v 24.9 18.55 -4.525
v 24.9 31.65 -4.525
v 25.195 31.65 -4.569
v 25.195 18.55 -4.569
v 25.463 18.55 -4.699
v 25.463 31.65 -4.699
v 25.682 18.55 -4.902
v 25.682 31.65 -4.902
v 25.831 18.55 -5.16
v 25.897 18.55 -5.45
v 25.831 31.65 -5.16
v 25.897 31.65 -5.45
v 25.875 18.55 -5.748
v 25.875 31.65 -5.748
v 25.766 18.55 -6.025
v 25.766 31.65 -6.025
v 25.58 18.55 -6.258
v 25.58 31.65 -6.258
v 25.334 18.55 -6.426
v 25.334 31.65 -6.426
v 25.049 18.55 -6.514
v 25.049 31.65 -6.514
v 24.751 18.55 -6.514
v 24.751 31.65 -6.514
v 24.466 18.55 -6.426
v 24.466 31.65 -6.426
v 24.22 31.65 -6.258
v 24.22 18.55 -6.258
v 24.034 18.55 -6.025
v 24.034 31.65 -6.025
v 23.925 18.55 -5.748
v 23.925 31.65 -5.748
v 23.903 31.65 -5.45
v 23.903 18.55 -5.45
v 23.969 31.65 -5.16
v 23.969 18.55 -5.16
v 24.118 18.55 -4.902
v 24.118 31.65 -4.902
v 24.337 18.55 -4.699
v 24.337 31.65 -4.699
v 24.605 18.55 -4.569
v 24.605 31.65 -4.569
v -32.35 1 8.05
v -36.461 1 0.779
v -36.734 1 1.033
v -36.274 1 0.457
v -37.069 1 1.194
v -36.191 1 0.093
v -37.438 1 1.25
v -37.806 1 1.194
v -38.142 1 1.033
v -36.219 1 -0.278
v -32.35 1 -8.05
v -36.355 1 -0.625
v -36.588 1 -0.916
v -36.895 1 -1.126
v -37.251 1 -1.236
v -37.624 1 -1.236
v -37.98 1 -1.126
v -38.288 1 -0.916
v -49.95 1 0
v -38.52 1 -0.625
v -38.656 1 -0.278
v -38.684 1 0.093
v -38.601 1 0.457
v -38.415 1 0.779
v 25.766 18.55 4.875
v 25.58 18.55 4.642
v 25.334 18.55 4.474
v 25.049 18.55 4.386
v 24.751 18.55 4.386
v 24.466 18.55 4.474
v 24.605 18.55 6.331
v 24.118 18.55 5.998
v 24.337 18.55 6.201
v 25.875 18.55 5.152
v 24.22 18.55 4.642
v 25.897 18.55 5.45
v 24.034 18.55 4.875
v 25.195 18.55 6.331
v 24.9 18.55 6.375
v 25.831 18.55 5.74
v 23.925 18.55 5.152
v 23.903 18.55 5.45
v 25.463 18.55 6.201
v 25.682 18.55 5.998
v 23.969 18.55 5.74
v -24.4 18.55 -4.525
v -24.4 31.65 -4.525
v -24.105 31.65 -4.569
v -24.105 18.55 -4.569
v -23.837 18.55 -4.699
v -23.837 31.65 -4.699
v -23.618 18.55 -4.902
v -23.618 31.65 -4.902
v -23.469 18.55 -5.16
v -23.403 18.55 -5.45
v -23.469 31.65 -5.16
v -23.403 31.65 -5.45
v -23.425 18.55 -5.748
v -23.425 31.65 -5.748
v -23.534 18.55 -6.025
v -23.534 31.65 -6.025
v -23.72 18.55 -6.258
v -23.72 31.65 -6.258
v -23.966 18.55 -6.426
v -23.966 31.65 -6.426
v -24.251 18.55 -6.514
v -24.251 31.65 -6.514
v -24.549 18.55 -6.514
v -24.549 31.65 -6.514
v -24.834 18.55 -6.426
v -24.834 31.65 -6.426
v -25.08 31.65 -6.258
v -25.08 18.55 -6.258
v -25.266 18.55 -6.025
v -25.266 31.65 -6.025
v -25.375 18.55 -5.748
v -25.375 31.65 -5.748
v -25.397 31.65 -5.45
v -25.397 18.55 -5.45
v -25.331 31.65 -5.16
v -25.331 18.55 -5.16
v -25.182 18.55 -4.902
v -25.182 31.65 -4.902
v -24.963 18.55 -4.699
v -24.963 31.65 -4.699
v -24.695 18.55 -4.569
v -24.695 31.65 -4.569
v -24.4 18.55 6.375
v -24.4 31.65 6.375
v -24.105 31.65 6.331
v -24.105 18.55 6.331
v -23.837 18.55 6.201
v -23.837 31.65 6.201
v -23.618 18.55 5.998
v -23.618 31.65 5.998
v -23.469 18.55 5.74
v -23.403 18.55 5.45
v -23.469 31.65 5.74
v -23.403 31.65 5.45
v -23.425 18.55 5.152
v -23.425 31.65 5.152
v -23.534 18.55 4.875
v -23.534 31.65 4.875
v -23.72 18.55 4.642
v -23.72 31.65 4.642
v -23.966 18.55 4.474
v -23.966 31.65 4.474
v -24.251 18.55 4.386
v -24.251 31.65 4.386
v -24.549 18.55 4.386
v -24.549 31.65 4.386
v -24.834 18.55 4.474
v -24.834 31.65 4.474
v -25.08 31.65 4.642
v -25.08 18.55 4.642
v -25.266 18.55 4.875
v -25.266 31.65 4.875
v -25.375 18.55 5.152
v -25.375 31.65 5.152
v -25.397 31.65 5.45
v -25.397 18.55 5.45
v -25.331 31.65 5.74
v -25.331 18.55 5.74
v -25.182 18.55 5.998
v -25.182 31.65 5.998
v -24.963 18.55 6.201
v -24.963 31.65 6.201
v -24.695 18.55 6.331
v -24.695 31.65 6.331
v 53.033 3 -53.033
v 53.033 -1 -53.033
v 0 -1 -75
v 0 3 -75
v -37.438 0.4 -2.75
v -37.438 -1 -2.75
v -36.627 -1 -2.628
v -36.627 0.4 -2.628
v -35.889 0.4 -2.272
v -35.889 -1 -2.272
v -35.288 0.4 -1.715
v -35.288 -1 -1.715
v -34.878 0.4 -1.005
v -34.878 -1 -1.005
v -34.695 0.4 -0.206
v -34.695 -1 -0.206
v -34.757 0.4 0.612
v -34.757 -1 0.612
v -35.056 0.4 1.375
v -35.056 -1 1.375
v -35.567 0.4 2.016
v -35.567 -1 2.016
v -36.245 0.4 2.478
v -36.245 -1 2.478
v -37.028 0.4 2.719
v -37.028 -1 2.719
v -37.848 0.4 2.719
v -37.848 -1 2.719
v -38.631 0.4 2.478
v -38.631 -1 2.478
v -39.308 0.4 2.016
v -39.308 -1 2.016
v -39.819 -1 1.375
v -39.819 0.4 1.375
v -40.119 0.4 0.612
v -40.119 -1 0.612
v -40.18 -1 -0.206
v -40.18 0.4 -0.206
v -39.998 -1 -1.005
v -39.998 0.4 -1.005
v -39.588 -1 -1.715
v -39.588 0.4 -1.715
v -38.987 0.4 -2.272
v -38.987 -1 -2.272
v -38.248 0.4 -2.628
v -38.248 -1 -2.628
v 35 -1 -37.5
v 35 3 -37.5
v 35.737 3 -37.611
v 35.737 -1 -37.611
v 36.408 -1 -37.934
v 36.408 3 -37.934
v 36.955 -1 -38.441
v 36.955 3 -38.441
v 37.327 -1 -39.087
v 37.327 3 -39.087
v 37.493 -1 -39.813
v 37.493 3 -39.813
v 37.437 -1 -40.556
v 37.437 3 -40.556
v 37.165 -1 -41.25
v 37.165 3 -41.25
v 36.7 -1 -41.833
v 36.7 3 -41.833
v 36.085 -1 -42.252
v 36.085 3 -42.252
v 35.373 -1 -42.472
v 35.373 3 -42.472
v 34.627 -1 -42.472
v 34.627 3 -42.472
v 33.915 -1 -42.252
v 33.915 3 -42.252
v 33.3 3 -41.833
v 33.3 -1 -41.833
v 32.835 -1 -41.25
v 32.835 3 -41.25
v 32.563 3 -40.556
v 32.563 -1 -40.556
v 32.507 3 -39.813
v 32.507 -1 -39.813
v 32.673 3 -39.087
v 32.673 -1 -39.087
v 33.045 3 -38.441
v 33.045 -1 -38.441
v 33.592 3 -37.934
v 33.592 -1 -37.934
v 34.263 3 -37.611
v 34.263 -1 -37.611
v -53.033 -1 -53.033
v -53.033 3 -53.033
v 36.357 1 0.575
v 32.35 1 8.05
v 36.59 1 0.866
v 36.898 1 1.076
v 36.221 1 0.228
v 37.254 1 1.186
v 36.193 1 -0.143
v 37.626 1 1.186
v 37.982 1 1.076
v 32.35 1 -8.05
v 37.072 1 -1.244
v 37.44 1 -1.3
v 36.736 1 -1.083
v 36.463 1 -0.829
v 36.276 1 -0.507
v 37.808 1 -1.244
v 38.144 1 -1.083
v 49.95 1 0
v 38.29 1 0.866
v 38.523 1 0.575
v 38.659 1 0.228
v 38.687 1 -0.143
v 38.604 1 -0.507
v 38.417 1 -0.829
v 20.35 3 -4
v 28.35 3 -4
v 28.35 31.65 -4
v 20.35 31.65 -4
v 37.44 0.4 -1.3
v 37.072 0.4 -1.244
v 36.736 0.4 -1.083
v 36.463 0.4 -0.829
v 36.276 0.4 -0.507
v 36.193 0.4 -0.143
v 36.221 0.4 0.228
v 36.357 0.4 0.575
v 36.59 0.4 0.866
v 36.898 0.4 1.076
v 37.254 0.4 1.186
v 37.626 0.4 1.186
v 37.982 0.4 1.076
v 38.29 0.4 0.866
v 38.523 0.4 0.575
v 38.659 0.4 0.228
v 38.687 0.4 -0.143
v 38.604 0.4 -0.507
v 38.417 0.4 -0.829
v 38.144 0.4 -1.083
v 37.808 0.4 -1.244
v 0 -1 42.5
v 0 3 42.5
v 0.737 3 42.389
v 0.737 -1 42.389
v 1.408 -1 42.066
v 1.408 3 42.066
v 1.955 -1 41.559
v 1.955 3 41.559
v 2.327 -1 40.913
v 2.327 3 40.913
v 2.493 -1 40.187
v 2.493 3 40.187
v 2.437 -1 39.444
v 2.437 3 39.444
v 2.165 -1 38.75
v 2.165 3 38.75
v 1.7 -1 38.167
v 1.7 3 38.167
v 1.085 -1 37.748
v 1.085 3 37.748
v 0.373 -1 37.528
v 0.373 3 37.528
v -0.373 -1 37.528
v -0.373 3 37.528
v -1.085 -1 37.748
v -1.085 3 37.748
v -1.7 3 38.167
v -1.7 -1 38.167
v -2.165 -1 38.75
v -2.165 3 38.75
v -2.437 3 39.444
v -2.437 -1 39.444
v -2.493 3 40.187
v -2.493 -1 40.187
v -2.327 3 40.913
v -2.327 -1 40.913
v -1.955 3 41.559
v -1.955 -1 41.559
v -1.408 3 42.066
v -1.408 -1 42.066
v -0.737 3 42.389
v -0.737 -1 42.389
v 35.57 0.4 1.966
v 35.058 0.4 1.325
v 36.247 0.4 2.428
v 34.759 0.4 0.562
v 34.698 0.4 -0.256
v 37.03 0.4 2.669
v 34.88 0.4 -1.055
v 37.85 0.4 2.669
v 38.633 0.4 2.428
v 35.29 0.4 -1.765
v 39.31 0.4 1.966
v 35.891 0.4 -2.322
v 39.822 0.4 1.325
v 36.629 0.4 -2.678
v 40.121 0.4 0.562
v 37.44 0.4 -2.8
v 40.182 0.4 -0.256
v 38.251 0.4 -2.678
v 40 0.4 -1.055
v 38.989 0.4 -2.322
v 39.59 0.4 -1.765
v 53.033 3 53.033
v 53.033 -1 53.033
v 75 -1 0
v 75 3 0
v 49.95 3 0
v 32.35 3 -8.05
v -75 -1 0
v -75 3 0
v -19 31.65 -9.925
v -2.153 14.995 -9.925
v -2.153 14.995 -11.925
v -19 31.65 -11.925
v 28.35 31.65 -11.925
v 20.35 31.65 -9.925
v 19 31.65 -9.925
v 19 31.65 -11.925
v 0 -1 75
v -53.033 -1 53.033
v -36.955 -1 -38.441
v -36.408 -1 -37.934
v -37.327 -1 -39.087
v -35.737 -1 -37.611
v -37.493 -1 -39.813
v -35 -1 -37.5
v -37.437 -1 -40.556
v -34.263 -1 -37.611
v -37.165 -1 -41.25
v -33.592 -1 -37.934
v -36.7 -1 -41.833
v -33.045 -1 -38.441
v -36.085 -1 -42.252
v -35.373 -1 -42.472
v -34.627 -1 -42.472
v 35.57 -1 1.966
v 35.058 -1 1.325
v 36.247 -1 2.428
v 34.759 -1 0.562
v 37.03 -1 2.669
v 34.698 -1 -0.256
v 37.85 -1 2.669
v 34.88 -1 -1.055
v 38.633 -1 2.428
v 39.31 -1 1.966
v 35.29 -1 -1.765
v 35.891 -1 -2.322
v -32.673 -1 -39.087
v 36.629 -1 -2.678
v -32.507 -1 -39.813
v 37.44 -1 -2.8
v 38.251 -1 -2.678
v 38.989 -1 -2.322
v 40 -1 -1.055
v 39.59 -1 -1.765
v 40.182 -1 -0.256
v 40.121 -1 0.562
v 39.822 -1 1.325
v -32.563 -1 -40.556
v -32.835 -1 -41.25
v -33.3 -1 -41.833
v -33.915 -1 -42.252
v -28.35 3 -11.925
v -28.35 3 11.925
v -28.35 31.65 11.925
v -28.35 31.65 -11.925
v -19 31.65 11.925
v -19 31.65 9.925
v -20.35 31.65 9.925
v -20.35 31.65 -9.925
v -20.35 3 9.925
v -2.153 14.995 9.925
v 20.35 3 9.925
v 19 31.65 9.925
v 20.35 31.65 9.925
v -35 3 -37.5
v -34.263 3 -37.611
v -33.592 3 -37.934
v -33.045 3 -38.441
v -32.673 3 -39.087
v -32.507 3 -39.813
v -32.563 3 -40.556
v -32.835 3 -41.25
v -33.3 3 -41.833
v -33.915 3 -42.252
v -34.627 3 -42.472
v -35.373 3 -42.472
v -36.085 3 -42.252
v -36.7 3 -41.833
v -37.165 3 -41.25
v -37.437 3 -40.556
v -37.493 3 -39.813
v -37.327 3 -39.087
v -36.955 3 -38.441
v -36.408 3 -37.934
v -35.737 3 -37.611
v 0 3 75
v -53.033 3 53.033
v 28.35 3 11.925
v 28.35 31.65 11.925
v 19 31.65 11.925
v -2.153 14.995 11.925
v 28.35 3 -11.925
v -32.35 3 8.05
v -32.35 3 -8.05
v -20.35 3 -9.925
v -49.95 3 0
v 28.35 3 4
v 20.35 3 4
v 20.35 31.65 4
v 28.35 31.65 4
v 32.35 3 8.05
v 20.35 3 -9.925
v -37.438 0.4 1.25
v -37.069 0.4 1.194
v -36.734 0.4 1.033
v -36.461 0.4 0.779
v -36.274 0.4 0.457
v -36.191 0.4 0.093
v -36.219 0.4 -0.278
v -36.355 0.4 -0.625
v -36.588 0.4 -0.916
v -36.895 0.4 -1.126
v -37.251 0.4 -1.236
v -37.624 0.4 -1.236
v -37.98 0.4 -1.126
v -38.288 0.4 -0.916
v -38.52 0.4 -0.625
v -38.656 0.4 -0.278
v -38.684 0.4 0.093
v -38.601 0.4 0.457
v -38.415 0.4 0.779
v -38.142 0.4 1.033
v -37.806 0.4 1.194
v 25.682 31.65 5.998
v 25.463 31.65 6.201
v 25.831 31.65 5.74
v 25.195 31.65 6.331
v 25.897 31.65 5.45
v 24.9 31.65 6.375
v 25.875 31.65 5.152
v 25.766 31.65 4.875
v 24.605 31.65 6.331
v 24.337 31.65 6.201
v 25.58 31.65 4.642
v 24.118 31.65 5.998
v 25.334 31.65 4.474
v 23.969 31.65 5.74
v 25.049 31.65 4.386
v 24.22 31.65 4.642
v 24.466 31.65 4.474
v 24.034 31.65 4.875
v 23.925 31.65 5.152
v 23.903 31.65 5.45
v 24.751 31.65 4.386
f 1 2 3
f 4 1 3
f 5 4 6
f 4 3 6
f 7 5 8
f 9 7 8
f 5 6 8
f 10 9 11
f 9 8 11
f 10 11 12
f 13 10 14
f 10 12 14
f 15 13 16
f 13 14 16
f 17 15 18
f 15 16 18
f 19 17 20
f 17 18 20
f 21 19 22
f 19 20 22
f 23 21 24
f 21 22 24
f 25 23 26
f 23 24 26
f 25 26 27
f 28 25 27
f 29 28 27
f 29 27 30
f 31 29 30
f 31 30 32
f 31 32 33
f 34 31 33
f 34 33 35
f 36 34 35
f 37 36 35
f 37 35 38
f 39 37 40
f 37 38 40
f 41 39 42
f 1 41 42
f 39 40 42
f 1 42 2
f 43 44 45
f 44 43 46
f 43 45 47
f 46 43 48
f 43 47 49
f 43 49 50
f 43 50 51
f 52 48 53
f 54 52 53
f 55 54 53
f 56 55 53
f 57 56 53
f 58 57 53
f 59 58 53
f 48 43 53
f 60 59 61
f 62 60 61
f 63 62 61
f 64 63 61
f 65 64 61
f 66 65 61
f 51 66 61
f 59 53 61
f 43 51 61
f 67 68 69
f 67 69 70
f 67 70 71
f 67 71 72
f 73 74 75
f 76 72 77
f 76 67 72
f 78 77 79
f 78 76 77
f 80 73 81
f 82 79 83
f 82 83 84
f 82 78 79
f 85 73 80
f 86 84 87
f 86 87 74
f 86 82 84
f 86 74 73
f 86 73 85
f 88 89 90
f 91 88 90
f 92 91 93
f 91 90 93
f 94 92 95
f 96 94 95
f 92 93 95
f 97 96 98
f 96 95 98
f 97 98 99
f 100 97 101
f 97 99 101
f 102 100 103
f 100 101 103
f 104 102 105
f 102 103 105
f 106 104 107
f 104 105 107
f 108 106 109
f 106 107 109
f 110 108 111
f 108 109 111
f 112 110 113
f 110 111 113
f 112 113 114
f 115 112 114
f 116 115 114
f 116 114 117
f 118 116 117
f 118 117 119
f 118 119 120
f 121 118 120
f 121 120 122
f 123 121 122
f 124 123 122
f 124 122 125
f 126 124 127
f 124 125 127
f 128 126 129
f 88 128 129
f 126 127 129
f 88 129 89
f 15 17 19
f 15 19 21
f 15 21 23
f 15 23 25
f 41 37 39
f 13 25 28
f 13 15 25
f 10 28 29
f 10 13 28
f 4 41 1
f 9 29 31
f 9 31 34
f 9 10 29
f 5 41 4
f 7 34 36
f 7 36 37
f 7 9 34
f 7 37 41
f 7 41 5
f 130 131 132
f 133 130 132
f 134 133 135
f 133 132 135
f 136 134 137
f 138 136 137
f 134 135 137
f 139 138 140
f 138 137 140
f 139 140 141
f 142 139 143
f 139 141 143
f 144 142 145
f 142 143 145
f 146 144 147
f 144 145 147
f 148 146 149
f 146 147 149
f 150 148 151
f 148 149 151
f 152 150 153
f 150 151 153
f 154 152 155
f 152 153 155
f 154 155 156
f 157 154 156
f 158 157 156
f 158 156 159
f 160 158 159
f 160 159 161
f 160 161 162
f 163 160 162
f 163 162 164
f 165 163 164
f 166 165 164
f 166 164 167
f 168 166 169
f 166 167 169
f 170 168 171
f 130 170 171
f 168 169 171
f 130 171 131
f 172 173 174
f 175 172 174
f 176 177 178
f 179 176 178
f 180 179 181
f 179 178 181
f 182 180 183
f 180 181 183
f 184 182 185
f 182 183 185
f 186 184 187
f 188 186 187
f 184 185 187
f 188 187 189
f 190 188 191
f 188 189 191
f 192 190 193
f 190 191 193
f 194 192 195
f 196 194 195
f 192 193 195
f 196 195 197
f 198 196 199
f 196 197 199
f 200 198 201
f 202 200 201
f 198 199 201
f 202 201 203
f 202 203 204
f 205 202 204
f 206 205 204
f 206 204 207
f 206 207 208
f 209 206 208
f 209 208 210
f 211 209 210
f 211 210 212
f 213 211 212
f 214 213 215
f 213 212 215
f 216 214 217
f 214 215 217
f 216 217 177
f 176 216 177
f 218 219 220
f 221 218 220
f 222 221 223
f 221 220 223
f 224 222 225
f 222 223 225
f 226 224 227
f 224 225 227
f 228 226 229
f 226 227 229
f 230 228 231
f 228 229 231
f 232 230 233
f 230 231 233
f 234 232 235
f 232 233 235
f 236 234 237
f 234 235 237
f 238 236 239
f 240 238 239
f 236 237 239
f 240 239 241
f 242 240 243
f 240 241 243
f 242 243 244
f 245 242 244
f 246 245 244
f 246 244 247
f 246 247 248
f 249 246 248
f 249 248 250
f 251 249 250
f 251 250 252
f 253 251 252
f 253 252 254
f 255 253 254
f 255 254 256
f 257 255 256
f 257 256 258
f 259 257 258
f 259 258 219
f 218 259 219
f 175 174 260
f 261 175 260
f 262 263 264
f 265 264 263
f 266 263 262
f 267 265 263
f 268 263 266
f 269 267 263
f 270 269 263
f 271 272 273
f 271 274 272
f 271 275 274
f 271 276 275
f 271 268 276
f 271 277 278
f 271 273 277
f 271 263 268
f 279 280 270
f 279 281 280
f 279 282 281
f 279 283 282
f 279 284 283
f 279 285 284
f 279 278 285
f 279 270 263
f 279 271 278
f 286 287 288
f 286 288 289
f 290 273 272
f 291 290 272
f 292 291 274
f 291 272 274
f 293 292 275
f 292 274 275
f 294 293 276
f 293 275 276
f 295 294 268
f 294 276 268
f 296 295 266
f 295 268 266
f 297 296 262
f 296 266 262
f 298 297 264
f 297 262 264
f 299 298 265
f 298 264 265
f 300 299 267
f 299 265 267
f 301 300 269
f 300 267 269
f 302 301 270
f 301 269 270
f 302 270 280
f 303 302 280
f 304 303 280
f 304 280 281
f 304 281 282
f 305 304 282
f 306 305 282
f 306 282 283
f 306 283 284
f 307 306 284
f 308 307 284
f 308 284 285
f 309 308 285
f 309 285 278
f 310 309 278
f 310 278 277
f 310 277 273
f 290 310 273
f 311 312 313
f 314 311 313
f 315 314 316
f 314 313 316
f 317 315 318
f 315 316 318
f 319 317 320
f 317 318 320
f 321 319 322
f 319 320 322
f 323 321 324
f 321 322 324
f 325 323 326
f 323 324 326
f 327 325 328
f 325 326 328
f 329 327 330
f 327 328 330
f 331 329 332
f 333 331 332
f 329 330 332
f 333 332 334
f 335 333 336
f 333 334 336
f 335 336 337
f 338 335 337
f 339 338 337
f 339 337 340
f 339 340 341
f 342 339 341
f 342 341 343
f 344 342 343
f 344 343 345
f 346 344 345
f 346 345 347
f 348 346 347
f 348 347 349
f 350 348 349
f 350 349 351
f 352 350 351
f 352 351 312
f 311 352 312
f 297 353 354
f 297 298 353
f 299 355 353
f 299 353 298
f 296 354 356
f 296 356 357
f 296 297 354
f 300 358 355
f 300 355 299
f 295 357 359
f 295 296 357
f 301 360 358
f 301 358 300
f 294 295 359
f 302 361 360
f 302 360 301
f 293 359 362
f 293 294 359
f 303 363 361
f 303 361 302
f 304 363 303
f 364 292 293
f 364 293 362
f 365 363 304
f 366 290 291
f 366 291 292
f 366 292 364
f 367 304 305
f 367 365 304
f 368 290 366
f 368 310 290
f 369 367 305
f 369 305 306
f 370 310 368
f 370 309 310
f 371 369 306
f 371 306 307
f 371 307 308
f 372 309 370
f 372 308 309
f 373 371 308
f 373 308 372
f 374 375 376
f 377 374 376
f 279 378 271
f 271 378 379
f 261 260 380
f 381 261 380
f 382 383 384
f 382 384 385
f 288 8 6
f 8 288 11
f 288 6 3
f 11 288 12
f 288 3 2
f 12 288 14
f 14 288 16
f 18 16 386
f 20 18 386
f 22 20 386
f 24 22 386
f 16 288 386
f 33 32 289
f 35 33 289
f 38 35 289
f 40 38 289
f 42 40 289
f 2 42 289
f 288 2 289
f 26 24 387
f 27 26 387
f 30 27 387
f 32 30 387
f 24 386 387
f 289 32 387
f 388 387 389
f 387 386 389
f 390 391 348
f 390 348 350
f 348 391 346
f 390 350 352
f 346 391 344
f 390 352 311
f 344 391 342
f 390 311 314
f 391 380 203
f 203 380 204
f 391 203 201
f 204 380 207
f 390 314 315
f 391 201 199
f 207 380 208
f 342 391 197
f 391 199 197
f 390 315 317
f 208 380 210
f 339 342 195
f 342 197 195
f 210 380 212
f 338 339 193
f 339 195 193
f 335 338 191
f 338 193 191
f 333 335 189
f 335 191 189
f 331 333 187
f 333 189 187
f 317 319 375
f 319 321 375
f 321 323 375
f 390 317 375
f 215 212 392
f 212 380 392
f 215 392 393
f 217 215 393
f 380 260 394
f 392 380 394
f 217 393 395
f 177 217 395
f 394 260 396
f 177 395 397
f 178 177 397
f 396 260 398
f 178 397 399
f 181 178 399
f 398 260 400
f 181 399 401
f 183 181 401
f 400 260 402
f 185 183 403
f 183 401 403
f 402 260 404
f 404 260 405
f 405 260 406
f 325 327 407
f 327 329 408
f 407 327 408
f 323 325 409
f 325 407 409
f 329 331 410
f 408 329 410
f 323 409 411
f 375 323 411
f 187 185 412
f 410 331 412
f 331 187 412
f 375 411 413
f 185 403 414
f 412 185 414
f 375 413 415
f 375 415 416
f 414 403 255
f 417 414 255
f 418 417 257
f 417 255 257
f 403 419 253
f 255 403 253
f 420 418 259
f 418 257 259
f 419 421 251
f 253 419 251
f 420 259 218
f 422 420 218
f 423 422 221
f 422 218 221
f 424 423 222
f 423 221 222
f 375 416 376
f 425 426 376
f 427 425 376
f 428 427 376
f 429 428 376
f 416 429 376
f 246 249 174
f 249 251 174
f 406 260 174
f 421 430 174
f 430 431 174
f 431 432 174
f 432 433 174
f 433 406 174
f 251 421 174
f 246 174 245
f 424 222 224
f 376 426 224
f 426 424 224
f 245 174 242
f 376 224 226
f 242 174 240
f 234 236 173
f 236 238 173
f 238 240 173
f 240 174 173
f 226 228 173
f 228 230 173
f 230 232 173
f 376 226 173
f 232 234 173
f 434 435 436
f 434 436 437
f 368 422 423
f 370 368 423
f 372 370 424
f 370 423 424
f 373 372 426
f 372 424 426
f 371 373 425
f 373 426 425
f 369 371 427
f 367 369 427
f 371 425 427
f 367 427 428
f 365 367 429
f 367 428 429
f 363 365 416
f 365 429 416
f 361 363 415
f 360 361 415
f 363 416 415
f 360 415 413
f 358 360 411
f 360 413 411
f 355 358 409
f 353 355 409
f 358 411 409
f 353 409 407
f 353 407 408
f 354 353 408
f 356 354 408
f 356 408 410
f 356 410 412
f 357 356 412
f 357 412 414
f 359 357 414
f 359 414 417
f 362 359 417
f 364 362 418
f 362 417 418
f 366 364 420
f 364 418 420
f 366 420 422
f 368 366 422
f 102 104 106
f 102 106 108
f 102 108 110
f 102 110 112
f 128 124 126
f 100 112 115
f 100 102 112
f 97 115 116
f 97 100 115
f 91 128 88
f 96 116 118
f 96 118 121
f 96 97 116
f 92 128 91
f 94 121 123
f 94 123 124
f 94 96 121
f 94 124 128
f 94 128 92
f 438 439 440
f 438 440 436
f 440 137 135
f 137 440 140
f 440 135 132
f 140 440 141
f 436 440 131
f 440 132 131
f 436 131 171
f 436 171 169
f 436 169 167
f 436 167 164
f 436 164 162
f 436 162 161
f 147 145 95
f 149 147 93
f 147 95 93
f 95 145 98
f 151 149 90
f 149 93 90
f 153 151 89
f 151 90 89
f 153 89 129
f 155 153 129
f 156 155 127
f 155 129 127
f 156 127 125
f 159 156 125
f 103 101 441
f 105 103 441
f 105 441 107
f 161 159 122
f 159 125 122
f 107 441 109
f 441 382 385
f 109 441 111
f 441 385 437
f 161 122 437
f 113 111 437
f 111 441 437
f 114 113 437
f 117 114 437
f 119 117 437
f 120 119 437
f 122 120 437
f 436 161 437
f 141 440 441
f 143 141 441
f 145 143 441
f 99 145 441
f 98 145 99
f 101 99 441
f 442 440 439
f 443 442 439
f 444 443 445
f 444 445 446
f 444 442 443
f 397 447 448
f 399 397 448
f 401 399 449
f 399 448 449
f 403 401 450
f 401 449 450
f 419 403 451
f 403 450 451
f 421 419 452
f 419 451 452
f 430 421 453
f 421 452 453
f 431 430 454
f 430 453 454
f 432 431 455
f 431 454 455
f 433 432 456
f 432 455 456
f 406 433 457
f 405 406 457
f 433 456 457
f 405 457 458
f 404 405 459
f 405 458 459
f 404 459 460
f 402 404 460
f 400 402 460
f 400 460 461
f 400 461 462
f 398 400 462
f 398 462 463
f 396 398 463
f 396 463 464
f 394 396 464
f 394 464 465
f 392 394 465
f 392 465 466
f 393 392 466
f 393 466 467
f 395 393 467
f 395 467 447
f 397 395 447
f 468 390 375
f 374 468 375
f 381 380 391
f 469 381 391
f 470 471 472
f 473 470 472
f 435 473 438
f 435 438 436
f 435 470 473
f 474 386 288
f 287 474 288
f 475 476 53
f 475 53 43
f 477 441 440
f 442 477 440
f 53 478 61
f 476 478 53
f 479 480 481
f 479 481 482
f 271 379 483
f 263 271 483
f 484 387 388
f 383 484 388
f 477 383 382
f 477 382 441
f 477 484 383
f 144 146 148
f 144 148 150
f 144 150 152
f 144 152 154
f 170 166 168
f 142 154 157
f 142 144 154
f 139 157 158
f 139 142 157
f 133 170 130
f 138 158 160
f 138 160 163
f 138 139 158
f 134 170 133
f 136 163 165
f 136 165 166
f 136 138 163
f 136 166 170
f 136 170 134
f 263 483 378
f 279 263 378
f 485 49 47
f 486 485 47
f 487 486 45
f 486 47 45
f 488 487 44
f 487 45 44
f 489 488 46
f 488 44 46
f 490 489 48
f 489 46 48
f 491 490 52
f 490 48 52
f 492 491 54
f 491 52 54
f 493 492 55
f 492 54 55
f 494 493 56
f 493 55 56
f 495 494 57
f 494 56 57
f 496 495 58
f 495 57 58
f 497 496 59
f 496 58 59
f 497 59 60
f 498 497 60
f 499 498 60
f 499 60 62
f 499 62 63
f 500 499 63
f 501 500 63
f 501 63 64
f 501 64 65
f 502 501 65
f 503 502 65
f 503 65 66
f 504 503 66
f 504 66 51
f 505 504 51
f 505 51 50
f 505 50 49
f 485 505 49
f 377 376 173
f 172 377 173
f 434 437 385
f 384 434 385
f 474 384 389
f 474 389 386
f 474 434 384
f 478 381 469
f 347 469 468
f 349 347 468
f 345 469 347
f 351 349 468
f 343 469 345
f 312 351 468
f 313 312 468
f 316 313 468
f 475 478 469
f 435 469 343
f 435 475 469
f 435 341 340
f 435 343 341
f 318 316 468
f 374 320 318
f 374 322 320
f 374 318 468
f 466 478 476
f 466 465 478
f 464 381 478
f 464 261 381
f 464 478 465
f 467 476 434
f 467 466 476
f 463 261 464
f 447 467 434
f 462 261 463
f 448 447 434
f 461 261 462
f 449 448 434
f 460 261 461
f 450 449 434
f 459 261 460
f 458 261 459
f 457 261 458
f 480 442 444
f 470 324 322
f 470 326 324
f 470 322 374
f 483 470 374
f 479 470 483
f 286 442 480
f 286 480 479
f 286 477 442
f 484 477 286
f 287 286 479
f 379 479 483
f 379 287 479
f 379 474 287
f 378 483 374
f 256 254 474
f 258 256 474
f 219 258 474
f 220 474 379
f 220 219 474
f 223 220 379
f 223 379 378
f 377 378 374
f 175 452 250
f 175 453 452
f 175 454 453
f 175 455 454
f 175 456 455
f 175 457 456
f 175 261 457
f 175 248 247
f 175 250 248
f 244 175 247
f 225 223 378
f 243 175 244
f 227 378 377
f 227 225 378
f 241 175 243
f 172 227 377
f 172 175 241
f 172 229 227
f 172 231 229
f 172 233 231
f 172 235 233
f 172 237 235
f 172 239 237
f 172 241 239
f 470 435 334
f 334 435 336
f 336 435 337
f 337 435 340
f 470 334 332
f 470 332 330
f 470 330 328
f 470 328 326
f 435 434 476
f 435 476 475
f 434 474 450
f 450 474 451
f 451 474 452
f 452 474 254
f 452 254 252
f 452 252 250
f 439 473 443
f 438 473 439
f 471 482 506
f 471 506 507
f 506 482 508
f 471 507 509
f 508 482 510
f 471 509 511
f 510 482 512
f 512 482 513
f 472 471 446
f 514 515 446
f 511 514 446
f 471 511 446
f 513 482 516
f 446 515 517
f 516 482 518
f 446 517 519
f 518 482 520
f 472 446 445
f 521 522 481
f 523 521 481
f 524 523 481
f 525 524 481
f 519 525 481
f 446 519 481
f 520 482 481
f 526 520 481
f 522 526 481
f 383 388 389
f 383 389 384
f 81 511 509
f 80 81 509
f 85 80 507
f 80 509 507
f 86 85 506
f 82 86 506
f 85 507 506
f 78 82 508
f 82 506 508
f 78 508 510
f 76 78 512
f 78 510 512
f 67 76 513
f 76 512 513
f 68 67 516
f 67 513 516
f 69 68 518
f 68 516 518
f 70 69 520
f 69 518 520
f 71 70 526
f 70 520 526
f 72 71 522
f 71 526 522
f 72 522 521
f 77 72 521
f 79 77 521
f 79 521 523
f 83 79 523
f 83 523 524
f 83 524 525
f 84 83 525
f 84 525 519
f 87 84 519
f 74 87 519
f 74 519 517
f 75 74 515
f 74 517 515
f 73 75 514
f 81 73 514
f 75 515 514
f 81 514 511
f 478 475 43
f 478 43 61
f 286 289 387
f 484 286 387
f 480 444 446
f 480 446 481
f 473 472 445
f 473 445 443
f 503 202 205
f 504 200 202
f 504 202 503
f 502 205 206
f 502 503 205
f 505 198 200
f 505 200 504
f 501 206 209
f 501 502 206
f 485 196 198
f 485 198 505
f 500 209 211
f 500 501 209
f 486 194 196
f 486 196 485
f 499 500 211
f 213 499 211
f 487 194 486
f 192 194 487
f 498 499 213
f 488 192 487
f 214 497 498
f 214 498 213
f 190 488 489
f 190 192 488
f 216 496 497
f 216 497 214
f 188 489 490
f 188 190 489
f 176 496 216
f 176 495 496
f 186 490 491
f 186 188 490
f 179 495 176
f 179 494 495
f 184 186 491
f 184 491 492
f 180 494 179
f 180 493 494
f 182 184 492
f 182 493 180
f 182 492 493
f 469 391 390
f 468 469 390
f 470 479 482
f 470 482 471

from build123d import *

# Parameters (mm, degrees)
AUFSATZ_LINEAR_AUSTRAGEN1_DEPTH      = 3
AUFSATZ_LINEAR_AUSTRAGEN1_DEPTH_BACK = 1
AUFSATZ_LINEAR_AUSTRAGEN3_DEPTH      = 31.65
SCHNITT_LINEAR_AUSTRAGEN1_DEPTH      = 28.65
SKIZZE7_R                            = 2.5
SCHNITT_LINEAR_AUSTRAGEN2_DEPTH      = 110.867294952
SCHNITT_LINEAR_AUSTRAGEN6_DEPTH      = 2
SKIZZE9_R                            = 1
SCHNITT_LINEAR_AUSTRAGEN5_DEPTH      = 13.1
SKIZZE10_R                           = 1.25
SCHNITT_LINEAR_AUSTRAGEN7_DEPTH      = 111.405717696
SKIZZE11_R                           = 2.75
SCHNITT_LINEAR_AUSTRAGEN8_DEPTH      = 1.4


with BuildPart() as part:
    # Skizze2 → Aufsatz-Linear austragen1 (new, two sides: drawn at the far end of the back side and taken through both)
    with BuildSketch(Plane(origin=(0, 0, 0), x_dir=(1, 0, 0), z_dir=(0, 1, 0)).offset(-AUFSATZ_LINEAR_AUSTRAGEN1_DEPTH_BACK)):
        Polygon((-53.033008589, 53.033008589), (0, 0), (53.033008589, 53.033008589), (0, 75), align=None)
        Polygon((53.033008589, 53.033008589), (0, 0), (75, 0), align=None)
        Polygon((75, 0), (0, 0), (53.033008589, -53.033008589), align=None)
        Polygon((53.033008589, -53.033008589), (0, 0), (-53.033008589, -53.033008589), (0, -75), align=None)
        Polygon((-53.033008589, 53.033008589), (-75, 0), (0, 0), align=None)
        Polygon((0, 0), (-75, 0), (-53.033008589, -53.033008589), align=None)
    extrude(amount=AUFSATZ_LINEAR_AUSTRAGEN1_DEPTH + AUFSATZ_LINEAR_AUSTRAGEN1_DEPTH_BACK)

    # Skizze5 → Aufsatz-Linear austragen3 (add)
    with BuildSketch(Plane(origin=(0, 0, 0), x_dir=(1, 0, 0), z_dir=(0, 1, 0))):
        Polygon((20.35, -4), (28.35, -4), (28.35, -11.925), (-28.35, -11.925), (-28.35, 11.925), (28.35, 11.925), (28.35, 4), (20.35, 4), (20.35, 9.925), (-20.35, 9.925), (-20.35, -9.925), (20.35, -9.925), align=None)
    extrude(amount=AUFSATZ_LINEAR_AUSTRAGEN3_DEPTH)

    # Skizze6 → Schnitt-Linear austragen1 (cut)
    with BuildSketch(Plane.XY.offset(11.925)):
        Polygon((-19, 31.65), (19, 31.65), (-2.152730863, 14.994542406), align=None)
    extrude(amount=-SCHNITT_LINEAR_AUSTRAGEN1_DEPTH, mode=Mode.SUBTRACT)

    # Skizze7 → Schnitt-Linear austragen2 (cut, through all)
    with BuildSketch(Plane(origin=(0, 3, 0), x_dir=(1, 0, 0), z_dir=(0, 1, 0))):
        with Locations(Location((35, 40, 0), (0, 0, 270))):
            Circle(SKIZZE7_R)
        with Locations(Location((-35, 40, 0), (0, 0, 270))):
            Circle(SKIZZE7_R)
        with Locations(Location((0, -40, 0), (0, 0, 270))):
            Circle(SKIZZE7_R)
    extrude(amount=-SCHNITT_LINEAR_AUSTRAGEN2_DEPTH, mode=Mode.SUBTRACT)

    # Skizze8 → Schnitt-Linear austragen6 (cut)
    with BuildSketch(Plane(origin=(0, 3, 0), x_dir=(1, 0, 0), z_dir=(0, 1, 0))):
        Polygon((-32.35, 8.05), (-32.35, -8.05), (-49.95, 0), align=None)
        Polygon((32.35, -8.05), (49.95, 0), (32.35, 8.05), align=None)
    extrude(amount=-SCHNITT_LINEAR_AUSTRAGEN6_DEPTH, mode=Mode.SUBTRACT)

    # Skizze9 → Schnitt-Linear austragen5 (cut)
    with BuildSketch(Plane(origin=(0, 31.65, 0), x_dir=(1, 0, 0), z_dir=(0, 1, 0))):
        with Locations(Location((-24.4, -5.375, 0), (0, 0, 270))):
            Circle(SKIZZE9_R)
        with Locations(Location((-24.4, 5.525, 0), (0, 0, 270))):
            Circle(SKIZZE9_R)
        with Locations(Location((24.9, 5.525, 0), (0, 0, 270))):
            Circle(SKIZZE9_R)
        with Locations(Location((24.9, -5.375, 0), (0, 0, 270))):
            Circle(SKIZZE9_R)
    extrude(amount=-SCHNITT_LINEAR_AUSTRAGEN5_DEPTH, mode=Mode.SUBTRACT)

    # Skizze10 → Schnitt-Linear austragen7 (cut, through all)
    with BuildSketch(Plane(origin=(0, 1, 0), x_dir=(1, 0, 0), z_dir=(0, 1, 0))):
        with Locations(Location((-37.437800905, 0, 0), (0, 0, 270))):
            Circle(SKIZZE10_R)
        with Locations(Location((37.44, 0.05, 0), (0, 0, 90))):
            Circle(SKIZZE10_R)
    extrude(amount=-SCHNITT_LINEAR_AUSTRAGEN7_DEPTH, mode=Mode.SUBTRACT)

    # Skizze11 → Schnitt-Linear austragen8 (cut)
    with BuildSketch(Plane.XZ.offset(1)):
        with Locations(Location((-37.437800905, 0, 0), (0, 0, 270))):
            Circle(SKIZZE11_R)
        with Locations(Location((37.44, -0.05, 0), (0, 0, 270))):
            Circle(SKIZZE11_R)
    extrude(amount=-SCHNITT_LINEAR_AUSTRAGEN8_DEPTH, mode=Mode.SUBTRACT)


solid = part.part
